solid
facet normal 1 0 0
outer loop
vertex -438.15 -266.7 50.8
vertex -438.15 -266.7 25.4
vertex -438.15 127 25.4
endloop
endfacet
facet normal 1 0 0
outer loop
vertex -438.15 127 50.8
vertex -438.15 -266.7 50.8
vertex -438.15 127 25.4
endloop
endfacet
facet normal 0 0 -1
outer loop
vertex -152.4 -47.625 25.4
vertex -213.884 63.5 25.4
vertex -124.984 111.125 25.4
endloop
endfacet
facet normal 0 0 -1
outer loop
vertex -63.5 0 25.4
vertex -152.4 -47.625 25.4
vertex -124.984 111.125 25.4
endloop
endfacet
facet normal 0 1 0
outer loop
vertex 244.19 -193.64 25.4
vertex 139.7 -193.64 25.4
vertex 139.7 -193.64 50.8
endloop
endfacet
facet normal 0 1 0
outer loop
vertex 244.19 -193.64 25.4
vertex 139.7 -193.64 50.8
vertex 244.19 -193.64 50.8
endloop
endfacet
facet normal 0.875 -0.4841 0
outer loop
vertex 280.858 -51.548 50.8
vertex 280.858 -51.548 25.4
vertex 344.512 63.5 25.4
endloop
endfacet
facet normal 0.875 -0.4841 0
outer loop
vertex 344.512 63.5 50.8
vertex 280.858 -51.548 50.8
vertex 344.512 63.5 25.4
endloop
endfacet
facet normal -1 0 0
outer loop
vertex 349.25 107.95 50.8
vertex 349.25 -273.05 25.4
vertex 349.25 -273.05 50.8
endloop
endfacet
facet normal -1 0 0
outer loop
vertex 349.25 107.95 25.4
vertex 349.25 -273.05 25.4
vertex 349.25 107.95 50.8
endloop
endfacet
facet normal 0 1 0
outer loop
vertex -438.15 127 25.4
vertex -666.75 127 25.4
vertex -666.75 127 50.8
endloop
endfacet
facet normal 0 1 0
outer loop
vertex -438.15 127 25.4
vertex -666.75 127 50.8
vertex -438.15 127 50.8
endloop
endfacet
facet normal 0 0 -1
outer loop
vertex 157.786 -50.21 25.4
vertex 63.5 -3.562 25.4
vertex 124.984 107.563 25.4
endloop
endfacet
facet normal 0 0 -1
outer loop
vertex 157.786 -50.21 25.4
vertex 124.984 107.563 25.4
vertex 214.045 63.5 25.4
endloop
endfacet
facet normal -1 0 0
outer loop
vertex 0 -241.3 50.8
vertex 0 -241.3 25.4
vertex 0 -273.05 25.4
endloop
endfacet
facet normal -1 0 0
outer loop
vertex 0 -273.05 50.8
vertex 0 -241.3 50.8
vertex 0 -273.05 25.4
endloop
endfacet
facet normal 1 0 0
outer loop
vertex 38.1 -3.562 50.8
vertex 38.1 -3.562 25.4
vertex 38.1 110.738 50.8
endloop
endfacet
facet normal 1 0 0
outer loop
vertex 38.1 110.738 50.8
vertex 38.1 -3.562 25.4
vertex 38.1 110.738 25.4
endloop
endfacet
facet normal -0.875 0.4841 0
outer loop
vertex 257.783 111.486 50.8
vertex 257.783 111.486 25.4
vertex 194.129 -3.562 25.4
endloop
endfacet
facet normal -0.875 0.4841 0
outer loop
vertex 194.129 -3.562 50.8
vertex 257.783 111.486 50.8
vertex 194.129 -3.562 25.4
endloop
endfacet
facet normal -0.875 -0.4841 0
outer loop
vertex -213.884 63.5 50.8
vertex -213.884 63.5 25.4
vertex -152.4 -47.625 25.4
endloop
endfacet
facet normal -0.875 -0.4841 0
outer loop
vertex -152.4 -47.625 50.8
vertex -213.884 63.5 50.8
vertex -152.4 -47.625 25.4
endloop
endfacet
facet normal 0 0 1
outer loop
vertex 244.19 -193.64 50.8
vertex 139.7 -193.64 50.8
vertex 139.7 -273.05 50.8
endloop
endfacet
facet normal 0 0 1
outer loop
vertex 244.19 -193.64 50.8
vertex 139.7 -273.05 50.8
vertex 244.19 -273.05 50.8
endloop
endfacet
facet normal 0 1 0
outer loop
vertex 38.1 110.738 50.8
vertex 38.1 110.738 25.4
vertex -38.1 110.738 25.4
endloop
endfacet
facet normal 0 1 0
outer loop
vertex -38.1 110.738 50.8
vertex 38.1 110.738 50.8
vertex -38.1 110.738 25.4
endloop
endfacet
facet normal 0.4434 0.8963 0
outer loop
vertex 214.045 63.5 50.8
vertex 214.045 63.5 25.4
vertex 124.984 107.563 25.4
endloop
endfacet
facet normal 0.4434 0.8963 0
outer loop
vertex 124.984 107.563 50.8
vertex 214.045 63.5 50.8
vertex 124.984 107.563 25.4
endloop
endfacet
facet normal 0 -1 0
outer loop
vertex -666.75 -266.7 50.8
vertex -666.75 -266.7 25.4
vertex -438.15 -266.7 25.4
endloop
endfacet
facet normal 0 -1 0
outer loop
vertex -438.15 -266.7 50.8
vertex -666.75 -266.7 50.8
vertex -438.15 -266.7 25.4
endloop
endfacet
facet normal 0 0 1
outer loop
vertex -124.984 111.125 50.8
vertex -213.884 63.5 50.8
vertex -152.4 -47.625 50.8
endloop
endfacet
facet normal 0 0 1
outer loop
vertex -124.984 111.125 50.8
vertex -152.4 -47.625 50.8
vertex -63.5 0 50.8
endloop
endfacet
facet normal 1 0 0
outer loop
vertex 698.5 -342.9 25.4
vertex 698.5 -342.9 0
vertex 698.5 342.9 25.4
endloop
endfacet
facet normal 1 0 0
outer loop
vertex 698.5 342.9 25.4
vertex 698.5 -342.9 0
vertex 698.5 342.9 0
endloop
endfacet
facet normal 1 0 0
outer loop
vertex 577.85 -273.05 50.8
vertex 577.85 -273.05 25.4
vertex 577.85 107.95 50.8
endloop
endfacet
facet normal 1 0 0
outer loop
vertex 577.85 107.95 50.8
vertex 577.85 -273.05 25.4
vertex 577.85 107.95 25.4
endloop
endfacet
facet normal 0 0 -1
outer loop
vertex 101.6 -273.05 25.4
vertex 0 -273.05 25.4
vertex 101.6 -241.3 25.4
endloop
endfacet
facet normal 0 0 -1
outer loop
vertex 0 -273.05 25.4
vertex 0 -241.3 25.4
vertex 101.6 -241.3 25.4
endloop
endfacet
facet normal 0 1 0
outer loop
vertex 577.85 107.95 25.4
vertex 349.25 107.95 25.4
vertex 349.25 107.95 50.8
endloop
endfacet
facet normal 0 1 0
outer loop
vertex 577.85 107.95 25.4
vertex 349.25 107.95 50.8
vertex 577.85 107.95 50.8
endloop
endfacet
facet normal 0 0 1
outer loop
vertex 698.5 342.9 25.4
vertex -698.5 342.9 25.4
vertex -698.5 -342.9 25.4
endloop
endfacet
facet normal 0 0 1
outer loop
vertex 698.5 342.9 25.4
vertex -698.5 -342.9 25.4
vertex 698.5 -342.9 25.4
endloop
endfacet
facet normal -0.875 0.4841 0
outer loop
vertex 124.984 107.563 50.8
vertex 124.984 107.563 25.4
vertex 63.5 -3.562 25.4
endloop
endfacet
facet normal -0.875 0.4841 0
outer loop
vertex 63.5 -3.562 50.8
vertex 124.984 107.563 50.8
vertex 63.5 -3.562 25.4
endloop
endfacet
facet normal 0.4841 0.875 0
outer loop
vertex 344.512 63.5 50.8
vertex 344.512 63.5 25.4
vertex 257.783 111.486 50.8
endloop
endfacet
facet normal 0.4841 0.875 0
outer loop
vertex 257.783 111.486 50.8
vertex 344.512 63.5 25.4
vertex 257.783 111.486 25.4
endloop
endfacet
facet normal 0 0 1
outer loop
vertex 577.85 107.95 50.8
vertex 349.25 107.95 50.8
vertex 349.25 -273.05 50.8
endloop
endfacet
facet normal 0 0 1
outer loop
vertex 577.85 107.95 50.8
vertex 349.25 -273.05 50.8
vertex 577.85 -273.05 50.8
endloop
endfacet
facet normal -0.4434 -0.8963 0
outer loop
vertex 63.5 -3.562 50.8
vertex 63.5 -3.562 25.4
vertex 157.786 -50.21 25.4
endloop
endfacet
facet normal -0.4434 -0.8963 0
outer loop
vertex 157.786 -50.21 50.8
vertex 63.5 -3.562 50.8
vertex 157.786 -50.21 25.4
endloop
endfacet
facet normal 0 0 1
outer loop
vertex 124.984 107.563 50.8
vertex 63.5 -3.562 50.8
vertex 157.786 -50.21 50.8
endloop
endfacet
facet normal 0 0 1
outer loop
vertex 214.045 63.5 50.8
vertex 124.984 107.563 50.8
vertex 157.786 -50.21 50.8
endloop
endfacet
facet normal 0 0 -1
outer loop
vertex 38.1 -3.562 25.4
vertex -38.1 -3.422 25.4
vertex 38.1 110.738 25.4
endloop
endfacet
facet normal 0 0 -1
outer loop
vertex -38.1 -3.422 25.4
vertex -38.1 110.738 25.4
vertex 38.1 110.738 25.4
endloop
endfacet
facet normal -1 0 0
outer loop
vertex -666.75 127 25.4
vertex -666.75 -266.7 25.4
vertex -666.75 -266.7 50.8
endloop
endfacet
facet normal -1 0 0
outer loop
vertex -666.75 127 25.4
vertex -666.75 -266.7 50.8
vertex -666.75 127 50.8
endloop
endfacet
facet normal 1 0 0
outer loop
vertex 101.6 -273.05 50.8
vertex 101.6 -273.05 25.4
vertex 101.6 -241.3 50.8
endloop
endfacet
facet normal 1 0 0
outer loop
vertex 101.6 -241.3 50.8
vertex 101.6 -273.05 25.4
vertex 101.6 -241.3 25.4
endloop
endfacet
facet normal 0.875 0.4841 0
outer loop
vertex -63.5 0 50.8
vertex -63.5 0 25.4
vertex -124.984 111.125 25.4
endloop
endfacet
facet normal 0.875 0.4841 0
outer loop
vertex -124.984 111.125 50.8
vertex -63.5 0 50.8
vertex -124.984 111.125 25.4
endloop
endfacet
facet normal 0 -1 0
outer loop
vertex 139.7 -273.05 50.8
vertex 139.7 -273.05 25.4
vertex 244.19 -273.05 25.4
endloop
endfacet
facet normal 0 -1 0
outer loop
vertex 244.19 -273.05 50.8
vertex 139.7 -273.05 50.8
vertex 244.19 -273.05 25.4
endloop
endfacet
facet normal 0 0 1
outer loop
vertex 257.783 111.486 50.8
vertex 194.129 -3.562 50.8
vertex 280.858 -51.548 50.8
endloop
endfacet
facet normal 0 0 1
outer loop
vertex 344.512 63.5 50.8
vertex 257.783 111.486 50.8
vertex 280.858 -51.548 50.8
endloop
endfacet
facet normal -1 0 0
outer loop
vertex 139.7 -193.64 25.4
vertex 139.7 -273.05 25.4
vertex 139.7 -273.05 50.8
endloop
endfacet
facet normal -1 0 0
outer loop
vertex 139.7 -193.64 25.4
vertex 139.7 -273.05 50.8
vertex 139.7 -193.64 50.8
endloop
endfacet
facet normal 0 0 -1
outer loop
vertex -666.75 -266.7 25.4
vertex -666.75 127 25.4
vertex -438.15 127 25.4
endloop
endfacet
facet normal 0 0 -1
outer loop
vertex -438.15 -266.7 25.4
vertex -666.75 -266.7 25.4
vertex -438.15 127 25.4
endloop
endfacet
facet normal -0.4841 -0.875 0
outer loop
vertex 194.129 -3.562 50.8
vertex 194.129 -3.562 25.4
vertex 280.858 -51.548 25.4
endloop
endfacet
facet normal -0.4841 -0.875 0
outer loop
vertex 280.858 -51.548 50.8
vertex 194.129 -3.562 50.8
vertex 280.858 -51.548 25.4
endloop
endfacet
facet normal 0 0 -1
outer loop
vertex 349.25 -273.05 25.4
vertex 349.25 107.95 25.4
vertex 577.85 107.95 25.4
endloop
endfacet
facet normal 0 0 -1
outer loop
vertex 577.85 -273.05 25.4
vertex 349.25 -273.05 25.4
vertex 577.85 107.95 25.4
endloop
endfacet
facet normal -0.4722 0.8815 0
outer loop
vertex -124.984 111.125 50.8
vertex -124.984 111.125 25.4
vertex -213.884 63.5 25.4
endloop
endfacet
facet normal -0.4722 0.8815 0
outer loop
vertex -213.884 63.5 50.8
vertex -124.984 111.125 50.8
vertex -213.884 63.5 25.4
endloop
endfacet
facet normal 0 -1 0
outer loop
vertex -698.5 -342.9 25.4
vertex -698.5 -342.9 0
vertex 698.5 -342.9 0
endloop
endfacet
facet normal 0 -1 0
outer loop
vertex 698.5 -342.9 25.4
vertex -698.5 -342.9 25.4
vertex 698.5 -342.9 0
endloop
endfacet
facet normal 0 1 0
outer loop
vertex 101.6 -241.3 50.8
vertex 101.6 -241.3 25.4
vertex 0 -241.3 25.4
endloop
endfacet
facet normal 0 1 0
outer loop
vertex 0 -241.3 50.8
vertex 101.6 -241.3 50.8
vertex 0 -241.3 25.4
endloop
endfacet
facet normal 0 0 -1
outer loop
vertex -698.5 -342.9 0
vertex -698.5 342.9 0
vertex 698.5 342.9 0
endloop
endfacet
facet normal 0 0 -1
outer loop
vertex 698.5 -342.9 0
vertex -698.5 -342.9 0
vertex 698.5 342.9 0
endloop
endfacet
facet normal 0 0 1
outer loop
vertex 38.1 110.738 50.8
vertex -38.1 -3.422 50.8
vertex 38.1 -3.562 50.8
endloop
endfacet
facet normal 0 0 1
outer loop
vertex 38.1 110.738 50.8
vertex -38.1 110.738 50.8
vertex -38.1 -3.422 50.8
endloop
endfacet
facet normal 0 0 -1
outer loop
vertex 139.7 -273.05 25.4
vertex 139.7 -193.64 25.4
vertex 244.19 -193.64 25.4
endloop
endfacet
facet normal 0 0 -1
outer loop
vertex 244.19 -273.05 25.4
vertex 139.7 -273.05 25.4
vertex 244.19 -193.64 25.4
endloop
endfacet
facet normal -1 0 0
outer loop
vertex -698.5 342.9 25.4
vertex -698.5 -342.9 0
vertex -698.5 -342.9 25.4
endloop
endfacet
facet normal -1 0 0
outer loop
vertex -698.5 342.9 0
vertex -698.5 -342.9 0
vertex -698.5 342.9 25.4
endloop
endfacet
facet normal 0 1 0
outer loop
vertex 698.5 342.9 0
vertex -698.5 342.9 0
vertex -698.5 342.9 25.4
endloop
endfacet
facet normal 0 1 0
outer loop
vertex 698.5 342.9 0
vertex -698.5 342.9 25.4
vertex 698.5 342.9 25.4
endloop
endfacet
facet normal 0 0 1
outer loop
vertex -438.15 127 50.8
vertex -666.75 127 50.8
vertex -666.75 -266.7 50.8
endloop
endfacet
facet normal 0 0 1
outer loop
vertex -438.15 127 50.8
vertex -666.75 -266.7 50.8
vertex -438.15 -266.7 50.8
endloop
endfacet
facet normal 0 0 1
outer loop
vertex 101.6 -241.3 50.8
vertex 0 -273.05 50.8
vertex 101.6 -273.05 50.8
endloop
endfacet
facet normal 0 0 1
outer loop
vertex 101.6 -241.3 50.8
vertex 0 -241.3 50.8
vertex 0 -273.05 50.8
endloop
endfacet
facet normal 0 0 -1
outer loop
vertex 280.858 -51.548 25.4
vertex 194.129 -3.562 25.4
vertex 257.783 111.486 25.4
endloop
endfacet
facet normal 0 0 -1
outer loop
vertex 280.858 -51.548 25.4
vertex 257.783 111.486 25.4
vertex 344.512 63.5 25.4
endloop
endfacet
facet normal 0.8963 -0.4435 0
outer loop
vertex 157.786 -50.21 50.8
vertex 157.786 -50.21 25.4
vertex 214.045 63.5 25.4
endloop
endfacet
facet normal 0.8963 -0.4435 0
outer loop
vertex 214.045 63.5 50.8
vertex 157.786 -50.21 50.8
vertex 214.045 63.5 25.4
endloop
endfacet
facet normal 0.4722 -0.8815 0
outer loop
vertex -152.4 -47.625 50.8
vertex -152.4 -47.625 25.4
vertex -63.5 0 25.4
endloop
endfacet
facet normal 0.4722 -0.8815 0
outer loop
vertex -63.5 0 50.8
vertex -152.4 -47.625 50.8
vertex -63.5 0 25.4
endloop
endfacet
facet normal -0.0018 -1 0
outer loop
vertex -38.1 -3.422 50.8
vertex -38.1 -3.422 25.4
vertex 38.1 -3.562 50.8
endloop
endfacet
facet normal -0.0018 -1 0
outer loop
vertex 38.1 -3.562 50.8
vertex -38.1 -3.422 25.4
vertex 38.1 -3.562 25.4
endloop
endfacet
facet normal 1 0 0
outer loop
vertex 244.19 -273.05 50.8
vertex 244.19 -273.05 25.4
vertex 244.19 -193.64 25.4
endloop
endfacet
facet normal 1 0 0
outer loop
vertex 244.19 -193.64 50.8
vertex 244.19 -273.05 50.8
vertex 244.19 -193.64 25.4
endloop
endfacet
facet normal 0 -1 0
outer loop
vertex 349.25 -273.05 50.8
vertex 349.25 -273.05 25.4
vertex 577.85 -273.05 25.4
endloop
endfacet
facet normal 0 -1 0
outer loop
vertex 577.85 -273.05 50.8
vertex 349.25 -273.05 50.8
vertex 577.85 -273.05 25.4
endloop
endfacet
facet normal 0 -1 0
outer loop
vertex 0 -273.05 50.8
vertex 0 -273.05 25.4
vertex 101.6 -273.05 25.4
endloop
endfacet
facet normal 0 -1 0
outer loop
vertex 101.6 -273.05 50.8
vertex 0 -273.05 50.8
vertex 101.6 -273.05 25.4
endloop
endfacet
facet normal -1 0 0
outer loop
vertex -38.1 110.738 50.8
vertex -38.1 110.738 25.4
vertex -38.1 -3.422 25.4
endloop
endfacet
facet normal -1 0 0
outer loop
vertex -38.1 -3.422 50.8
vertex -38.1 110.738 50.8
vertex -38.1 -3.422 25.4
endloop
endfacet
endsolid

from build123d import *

# Parameters (mm, degrees)
F0_W     = 1397
F0_H     = 685.8
F1_DEPTH = 25.4
F2_W     = 228.6
F2_H     = 393.7
F2_H_2   = 381
F2_W_2   = 104.490054
F2_H_3   = 79.409756
F3_DEPTH = 25.4


with BuildPart() as f1:
    # F0 (on Top) → F1 (new body)
    with BuildSketch(Plane.XY):
        Rectangle(F0_W, F0_H)
    extrude(amount=F1_DEPTH)


with BuildPart() as f3:
    # F2 (on face) → F3 (new body)
    with BuildSketch(Plane.XY.offset(25.4)):
        Polygon((-0.023387, 53.623086), (-38.1, -3.421758), (38.1, -3.561994), align=None)
        Polygon((-38.1, 110.738006), (-38.1, -3.421758), (-0.023387, 53.623086), align=None)
        Polygon((-0.023387, 53.623086), (38.1, -3.561994), (38.1, 110.738006), align=None)
        Polygon((38.1, 110.738006), (-38.1, 110.738006), (-0.023387, 53.623086), align=None)
        with Locations((-552.45, -69.85)):
            Rectangle(F2_W, F2_H)
        with Locations((463.55, -82.55)):
            Rectangle(F2_W, F2_H_2)
        Polygon((101.6, -241.3), (0, -273.05), (101.6, -273.05), align=None)
        Polygon((0, -241.3), (0, -273.05), (101.6, -241.3), align=None)
        with Locations((191.945027, -233.345122)):
            Rectangle(F2_W_2, F2_H_3)
        Polygon((124.983611, 107.563006), (63.5, -3.561994), (157.786446, -50.210266), (214.044664, 63.5), align=None)
        Polygon((257.782698, 111.485978), (194.128571, -3.561994), (280.858056, -51.547973), (344.512182, 63.5), align=None)
        Polygon((-63.5, 0), (-124.983611, 111.125), (-213.883611, 63.5), (-152.4, -47.625), align=None)
    extrude(amount=F3_DEPTH)


solid = Compound([f1.part, f3.part])
